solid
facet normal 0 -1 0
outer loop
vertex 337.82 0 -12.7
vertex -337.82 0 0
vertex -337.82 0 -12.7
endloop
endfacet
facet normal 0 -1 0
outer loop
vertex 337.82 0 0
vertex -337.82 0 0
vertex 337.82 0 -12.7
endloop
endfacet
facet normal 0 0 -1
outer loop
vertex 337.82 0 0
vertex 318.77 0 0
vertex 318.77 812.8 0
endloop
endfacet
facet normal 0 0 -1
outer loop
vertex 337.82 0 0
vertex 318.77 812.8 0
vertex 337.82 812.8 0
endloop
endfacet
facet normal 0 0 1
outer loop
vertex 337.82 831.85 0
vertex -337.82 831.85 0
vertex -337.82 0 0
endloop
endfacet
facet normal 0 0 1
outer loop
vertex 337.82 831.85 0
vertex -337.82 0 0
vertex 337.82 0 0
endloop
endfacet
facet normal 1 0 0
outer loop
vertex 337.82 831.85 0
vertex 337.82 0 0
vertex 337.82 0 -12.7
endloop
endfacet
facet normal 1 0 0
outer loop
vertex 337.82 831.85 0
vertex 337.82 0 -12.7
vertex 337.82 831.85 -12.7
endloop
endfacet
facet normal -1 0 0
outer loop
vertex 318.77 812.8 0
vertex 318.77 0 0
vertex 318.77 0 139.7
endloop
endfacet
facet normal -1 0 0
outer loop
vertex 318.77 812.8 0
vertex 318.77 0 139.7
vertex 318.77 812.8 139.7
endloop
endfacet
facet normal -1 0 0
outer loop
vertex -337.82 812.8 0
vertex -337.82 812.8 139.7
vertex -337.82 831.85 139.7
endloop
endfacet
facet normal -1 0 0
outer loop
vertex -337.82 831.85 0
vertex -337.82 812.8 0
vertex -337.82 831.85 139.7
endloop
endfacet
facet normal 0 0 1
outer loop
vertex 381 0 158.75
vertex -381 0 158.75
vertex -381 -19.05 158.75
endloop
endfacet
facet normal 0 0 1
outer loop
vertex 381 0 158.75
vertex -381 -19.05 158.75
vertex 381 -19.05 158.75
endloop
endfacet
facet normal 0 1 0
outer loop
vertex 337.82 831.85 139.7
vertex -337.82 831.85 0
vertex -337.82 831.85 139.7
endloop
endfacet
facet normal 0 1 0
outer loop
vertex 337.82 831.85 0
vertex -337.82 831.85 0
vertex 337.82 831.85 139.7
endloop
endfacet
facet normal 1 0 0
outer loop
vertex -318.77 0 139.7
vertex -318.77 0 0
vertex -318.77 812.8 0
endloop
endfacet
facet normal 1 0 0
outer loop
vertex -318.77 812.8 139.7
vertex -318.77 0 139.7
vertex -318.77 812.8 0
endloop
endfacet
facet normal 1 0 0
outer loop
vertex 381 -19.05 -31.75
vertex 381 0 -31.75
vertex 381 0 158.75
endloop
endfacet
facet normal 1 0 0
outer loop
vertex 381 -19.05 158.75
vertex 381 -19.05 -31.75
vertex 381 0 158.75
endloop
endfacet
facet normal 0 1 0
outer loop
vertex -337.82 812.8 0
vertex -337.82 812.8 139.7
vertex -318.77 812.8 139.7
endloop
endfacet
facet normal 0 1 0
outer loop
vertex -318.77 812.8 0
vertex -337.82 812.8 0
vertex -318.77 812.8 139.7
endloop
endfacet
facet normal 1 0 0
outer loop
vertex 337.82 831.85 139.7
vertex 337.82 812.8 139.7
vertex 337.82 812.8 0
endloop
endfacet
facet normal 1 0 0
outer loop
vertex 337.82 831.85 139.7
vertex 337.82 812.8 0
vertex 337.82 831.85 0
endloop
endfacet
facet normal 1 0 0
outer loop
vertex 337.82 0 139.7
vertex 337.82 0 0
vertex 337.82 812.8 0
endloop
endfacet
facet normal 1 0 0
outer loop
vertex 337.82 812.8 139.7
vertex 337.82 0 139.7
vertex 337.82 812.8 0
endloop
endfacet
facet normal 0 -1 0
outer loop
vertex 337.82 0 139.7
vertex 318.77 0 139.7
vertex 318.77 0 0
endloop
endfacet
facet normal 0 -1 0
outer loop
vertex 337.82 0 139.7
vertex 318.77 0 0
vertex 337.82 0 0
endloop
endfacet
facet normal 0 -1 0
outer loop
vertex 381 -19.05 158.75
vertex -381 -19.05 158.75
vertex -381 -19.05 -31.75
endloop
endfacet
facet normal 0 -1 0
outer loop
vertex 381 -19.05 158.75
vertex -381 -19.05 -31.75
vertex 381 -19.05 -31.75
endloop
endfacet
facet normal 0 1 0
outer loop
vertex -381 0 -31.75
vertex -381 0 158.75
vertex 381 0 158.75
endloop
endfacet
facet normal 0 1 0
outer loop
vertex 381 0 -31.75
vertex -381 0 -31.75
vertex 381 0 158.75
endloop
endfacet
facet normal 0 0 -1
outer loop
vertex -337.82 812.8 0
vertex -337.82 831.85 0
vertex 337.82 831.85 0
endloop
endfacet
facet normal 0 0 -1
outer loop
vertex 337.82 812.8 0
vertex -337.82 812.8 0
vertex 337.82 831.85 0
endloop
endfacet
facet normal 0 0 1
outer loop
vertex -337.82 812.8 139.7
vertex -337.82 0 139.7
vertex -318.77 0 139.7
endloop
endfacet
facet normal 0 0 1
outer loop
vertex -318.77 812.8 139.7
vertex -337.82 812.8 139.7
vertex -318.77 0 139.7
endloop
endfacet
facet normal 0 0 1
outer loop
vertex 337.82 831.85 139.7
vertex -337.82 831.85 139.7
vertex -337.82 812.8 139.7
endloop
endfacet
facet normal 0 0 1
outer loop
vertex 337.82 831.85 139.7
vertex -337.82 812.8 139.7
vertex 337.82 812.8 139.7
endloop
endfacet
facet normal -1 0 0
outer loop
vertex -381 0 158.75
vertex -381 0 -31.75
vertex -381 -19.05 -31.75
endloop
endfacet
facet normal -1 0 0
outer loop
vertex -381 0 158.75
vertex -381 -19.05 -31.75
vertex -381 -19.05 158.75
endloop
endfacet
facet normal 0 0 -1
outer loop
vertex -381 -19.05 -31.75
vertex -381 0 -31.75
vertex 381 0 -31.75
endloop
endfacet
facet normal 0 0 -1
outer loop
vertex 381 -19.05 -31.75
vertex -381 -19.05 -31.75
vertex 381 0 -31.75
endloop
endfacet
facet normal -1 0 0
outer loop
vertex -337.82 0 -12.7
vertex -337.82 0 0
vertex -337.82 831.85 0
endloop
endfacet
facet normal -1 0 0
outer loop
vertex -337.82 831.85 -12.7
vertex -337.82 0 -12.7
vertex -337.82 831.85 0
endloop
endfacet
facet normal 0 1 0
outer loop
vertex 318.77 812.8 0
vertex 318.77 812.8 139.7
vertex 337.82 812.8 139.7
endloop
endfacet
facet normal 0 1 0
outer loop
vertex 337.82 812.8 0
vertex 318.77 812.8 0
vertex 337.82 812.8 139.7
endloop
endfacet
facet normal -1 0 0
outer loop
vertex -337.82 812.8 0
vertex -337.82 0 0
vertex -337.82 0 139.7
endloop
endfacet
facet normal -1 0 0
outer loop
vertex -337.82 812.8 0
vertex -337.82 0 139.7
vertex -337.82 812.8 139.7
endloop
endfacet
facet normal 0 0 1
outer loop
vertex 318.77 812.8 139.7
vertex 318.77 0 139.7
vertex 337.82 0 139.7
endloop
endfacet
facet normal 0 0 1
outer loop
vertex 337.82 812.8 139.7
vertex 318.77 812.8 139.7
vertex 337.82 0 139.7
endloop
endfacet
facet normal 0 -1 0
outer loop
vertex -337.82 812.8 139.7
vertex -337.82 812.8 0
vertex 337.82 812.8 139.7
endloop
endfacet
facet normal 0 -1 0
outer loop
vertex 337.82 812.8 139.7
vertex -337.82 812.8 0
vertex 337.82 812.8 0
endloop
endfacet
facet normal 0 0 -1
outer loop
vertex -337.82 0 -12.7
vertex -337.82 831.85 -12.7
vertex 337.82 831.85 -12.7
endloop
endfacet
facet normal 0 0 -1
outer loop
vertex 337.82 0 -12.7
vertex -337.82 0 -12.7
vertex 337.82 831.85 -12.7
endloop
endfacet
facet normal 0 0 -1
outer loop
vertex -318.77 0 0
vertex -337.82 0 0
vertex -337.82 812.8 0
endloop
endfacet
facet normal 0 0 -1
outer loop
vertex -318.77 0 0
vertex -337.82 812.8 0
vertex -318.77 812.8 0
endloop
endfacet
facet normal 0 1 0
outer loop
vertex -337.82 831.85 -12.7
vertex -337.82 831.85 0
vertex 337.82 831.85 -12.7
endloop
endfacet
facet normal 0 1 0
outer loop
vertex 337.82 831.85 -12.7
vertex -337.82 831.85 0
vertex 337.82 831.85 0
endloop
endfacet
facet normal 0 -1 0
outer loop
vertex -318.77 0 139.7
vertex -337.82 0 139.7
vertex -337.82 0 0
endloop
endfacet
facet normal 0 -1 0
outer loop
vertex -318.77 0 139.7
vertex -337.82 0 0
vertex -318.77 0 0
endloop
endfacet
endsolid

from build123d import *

# Parameters (mm, degrees)
F0_W     = 19.05
F0_H     = 812.8
F1_DEPTH = 139.7
F2_W     = 675.64
F2_H     = 19.05
F3_DEPTH = 139.7
F4_W     = 675.64
F4_H     = 831.85
F5_DEPTH = 12.7
F6_W     = 762
F6_H     = 190.5
F7_DEPTH = 19.05


with BuildPart() as f1:
    # F0 (on Top) → F1 (new body)
    with BuildSketch(Plane.XY):
        with Locations((328.295, 406.4)):
            Rectangle(F0_W, F0_H)
    extrude(amount=F1_DEPTH)


with BuildPart() as f1b:
    # F0 (on Top) → F1, piece 2 (new body)
    with BuildSketch(Plane.XY):
        with Locations((-328.295, 406.4)):
            Rectangle(F0_W, F0_H)
    extrude(amount=F1_DEPTH)


with BuildPart() as f3:
    # F2 (on Top) → F3 (new body)
    with BuildSketch(Plane.XY):
        with Locations((0, 822.325)):
            Rectangle(F2_W, F2_H)
    extrude(amount=F3_DEPTH)


with BuildPart() as f5:
    # F4 (on Top) → F5 (new body)
    with BuildSketch(Plane.XY):
        with Locations((0, 415.925)):
            Rectangle(F4_W, F4_H)
    extrude(amount=-F5_DEPTH)


with BuildPart() as f7:
    # F6 (on Front) → F7 (new body)
    with BuildSketch(Plane.XZ):
        with Locations((0, 63.5)):
            Rectangle(F6_W, F6_H)
    extrude(amount=F7_DEPTH)


solid = Compound([f1.part, f1b.part, f3.part, f5.part, f7.part])
